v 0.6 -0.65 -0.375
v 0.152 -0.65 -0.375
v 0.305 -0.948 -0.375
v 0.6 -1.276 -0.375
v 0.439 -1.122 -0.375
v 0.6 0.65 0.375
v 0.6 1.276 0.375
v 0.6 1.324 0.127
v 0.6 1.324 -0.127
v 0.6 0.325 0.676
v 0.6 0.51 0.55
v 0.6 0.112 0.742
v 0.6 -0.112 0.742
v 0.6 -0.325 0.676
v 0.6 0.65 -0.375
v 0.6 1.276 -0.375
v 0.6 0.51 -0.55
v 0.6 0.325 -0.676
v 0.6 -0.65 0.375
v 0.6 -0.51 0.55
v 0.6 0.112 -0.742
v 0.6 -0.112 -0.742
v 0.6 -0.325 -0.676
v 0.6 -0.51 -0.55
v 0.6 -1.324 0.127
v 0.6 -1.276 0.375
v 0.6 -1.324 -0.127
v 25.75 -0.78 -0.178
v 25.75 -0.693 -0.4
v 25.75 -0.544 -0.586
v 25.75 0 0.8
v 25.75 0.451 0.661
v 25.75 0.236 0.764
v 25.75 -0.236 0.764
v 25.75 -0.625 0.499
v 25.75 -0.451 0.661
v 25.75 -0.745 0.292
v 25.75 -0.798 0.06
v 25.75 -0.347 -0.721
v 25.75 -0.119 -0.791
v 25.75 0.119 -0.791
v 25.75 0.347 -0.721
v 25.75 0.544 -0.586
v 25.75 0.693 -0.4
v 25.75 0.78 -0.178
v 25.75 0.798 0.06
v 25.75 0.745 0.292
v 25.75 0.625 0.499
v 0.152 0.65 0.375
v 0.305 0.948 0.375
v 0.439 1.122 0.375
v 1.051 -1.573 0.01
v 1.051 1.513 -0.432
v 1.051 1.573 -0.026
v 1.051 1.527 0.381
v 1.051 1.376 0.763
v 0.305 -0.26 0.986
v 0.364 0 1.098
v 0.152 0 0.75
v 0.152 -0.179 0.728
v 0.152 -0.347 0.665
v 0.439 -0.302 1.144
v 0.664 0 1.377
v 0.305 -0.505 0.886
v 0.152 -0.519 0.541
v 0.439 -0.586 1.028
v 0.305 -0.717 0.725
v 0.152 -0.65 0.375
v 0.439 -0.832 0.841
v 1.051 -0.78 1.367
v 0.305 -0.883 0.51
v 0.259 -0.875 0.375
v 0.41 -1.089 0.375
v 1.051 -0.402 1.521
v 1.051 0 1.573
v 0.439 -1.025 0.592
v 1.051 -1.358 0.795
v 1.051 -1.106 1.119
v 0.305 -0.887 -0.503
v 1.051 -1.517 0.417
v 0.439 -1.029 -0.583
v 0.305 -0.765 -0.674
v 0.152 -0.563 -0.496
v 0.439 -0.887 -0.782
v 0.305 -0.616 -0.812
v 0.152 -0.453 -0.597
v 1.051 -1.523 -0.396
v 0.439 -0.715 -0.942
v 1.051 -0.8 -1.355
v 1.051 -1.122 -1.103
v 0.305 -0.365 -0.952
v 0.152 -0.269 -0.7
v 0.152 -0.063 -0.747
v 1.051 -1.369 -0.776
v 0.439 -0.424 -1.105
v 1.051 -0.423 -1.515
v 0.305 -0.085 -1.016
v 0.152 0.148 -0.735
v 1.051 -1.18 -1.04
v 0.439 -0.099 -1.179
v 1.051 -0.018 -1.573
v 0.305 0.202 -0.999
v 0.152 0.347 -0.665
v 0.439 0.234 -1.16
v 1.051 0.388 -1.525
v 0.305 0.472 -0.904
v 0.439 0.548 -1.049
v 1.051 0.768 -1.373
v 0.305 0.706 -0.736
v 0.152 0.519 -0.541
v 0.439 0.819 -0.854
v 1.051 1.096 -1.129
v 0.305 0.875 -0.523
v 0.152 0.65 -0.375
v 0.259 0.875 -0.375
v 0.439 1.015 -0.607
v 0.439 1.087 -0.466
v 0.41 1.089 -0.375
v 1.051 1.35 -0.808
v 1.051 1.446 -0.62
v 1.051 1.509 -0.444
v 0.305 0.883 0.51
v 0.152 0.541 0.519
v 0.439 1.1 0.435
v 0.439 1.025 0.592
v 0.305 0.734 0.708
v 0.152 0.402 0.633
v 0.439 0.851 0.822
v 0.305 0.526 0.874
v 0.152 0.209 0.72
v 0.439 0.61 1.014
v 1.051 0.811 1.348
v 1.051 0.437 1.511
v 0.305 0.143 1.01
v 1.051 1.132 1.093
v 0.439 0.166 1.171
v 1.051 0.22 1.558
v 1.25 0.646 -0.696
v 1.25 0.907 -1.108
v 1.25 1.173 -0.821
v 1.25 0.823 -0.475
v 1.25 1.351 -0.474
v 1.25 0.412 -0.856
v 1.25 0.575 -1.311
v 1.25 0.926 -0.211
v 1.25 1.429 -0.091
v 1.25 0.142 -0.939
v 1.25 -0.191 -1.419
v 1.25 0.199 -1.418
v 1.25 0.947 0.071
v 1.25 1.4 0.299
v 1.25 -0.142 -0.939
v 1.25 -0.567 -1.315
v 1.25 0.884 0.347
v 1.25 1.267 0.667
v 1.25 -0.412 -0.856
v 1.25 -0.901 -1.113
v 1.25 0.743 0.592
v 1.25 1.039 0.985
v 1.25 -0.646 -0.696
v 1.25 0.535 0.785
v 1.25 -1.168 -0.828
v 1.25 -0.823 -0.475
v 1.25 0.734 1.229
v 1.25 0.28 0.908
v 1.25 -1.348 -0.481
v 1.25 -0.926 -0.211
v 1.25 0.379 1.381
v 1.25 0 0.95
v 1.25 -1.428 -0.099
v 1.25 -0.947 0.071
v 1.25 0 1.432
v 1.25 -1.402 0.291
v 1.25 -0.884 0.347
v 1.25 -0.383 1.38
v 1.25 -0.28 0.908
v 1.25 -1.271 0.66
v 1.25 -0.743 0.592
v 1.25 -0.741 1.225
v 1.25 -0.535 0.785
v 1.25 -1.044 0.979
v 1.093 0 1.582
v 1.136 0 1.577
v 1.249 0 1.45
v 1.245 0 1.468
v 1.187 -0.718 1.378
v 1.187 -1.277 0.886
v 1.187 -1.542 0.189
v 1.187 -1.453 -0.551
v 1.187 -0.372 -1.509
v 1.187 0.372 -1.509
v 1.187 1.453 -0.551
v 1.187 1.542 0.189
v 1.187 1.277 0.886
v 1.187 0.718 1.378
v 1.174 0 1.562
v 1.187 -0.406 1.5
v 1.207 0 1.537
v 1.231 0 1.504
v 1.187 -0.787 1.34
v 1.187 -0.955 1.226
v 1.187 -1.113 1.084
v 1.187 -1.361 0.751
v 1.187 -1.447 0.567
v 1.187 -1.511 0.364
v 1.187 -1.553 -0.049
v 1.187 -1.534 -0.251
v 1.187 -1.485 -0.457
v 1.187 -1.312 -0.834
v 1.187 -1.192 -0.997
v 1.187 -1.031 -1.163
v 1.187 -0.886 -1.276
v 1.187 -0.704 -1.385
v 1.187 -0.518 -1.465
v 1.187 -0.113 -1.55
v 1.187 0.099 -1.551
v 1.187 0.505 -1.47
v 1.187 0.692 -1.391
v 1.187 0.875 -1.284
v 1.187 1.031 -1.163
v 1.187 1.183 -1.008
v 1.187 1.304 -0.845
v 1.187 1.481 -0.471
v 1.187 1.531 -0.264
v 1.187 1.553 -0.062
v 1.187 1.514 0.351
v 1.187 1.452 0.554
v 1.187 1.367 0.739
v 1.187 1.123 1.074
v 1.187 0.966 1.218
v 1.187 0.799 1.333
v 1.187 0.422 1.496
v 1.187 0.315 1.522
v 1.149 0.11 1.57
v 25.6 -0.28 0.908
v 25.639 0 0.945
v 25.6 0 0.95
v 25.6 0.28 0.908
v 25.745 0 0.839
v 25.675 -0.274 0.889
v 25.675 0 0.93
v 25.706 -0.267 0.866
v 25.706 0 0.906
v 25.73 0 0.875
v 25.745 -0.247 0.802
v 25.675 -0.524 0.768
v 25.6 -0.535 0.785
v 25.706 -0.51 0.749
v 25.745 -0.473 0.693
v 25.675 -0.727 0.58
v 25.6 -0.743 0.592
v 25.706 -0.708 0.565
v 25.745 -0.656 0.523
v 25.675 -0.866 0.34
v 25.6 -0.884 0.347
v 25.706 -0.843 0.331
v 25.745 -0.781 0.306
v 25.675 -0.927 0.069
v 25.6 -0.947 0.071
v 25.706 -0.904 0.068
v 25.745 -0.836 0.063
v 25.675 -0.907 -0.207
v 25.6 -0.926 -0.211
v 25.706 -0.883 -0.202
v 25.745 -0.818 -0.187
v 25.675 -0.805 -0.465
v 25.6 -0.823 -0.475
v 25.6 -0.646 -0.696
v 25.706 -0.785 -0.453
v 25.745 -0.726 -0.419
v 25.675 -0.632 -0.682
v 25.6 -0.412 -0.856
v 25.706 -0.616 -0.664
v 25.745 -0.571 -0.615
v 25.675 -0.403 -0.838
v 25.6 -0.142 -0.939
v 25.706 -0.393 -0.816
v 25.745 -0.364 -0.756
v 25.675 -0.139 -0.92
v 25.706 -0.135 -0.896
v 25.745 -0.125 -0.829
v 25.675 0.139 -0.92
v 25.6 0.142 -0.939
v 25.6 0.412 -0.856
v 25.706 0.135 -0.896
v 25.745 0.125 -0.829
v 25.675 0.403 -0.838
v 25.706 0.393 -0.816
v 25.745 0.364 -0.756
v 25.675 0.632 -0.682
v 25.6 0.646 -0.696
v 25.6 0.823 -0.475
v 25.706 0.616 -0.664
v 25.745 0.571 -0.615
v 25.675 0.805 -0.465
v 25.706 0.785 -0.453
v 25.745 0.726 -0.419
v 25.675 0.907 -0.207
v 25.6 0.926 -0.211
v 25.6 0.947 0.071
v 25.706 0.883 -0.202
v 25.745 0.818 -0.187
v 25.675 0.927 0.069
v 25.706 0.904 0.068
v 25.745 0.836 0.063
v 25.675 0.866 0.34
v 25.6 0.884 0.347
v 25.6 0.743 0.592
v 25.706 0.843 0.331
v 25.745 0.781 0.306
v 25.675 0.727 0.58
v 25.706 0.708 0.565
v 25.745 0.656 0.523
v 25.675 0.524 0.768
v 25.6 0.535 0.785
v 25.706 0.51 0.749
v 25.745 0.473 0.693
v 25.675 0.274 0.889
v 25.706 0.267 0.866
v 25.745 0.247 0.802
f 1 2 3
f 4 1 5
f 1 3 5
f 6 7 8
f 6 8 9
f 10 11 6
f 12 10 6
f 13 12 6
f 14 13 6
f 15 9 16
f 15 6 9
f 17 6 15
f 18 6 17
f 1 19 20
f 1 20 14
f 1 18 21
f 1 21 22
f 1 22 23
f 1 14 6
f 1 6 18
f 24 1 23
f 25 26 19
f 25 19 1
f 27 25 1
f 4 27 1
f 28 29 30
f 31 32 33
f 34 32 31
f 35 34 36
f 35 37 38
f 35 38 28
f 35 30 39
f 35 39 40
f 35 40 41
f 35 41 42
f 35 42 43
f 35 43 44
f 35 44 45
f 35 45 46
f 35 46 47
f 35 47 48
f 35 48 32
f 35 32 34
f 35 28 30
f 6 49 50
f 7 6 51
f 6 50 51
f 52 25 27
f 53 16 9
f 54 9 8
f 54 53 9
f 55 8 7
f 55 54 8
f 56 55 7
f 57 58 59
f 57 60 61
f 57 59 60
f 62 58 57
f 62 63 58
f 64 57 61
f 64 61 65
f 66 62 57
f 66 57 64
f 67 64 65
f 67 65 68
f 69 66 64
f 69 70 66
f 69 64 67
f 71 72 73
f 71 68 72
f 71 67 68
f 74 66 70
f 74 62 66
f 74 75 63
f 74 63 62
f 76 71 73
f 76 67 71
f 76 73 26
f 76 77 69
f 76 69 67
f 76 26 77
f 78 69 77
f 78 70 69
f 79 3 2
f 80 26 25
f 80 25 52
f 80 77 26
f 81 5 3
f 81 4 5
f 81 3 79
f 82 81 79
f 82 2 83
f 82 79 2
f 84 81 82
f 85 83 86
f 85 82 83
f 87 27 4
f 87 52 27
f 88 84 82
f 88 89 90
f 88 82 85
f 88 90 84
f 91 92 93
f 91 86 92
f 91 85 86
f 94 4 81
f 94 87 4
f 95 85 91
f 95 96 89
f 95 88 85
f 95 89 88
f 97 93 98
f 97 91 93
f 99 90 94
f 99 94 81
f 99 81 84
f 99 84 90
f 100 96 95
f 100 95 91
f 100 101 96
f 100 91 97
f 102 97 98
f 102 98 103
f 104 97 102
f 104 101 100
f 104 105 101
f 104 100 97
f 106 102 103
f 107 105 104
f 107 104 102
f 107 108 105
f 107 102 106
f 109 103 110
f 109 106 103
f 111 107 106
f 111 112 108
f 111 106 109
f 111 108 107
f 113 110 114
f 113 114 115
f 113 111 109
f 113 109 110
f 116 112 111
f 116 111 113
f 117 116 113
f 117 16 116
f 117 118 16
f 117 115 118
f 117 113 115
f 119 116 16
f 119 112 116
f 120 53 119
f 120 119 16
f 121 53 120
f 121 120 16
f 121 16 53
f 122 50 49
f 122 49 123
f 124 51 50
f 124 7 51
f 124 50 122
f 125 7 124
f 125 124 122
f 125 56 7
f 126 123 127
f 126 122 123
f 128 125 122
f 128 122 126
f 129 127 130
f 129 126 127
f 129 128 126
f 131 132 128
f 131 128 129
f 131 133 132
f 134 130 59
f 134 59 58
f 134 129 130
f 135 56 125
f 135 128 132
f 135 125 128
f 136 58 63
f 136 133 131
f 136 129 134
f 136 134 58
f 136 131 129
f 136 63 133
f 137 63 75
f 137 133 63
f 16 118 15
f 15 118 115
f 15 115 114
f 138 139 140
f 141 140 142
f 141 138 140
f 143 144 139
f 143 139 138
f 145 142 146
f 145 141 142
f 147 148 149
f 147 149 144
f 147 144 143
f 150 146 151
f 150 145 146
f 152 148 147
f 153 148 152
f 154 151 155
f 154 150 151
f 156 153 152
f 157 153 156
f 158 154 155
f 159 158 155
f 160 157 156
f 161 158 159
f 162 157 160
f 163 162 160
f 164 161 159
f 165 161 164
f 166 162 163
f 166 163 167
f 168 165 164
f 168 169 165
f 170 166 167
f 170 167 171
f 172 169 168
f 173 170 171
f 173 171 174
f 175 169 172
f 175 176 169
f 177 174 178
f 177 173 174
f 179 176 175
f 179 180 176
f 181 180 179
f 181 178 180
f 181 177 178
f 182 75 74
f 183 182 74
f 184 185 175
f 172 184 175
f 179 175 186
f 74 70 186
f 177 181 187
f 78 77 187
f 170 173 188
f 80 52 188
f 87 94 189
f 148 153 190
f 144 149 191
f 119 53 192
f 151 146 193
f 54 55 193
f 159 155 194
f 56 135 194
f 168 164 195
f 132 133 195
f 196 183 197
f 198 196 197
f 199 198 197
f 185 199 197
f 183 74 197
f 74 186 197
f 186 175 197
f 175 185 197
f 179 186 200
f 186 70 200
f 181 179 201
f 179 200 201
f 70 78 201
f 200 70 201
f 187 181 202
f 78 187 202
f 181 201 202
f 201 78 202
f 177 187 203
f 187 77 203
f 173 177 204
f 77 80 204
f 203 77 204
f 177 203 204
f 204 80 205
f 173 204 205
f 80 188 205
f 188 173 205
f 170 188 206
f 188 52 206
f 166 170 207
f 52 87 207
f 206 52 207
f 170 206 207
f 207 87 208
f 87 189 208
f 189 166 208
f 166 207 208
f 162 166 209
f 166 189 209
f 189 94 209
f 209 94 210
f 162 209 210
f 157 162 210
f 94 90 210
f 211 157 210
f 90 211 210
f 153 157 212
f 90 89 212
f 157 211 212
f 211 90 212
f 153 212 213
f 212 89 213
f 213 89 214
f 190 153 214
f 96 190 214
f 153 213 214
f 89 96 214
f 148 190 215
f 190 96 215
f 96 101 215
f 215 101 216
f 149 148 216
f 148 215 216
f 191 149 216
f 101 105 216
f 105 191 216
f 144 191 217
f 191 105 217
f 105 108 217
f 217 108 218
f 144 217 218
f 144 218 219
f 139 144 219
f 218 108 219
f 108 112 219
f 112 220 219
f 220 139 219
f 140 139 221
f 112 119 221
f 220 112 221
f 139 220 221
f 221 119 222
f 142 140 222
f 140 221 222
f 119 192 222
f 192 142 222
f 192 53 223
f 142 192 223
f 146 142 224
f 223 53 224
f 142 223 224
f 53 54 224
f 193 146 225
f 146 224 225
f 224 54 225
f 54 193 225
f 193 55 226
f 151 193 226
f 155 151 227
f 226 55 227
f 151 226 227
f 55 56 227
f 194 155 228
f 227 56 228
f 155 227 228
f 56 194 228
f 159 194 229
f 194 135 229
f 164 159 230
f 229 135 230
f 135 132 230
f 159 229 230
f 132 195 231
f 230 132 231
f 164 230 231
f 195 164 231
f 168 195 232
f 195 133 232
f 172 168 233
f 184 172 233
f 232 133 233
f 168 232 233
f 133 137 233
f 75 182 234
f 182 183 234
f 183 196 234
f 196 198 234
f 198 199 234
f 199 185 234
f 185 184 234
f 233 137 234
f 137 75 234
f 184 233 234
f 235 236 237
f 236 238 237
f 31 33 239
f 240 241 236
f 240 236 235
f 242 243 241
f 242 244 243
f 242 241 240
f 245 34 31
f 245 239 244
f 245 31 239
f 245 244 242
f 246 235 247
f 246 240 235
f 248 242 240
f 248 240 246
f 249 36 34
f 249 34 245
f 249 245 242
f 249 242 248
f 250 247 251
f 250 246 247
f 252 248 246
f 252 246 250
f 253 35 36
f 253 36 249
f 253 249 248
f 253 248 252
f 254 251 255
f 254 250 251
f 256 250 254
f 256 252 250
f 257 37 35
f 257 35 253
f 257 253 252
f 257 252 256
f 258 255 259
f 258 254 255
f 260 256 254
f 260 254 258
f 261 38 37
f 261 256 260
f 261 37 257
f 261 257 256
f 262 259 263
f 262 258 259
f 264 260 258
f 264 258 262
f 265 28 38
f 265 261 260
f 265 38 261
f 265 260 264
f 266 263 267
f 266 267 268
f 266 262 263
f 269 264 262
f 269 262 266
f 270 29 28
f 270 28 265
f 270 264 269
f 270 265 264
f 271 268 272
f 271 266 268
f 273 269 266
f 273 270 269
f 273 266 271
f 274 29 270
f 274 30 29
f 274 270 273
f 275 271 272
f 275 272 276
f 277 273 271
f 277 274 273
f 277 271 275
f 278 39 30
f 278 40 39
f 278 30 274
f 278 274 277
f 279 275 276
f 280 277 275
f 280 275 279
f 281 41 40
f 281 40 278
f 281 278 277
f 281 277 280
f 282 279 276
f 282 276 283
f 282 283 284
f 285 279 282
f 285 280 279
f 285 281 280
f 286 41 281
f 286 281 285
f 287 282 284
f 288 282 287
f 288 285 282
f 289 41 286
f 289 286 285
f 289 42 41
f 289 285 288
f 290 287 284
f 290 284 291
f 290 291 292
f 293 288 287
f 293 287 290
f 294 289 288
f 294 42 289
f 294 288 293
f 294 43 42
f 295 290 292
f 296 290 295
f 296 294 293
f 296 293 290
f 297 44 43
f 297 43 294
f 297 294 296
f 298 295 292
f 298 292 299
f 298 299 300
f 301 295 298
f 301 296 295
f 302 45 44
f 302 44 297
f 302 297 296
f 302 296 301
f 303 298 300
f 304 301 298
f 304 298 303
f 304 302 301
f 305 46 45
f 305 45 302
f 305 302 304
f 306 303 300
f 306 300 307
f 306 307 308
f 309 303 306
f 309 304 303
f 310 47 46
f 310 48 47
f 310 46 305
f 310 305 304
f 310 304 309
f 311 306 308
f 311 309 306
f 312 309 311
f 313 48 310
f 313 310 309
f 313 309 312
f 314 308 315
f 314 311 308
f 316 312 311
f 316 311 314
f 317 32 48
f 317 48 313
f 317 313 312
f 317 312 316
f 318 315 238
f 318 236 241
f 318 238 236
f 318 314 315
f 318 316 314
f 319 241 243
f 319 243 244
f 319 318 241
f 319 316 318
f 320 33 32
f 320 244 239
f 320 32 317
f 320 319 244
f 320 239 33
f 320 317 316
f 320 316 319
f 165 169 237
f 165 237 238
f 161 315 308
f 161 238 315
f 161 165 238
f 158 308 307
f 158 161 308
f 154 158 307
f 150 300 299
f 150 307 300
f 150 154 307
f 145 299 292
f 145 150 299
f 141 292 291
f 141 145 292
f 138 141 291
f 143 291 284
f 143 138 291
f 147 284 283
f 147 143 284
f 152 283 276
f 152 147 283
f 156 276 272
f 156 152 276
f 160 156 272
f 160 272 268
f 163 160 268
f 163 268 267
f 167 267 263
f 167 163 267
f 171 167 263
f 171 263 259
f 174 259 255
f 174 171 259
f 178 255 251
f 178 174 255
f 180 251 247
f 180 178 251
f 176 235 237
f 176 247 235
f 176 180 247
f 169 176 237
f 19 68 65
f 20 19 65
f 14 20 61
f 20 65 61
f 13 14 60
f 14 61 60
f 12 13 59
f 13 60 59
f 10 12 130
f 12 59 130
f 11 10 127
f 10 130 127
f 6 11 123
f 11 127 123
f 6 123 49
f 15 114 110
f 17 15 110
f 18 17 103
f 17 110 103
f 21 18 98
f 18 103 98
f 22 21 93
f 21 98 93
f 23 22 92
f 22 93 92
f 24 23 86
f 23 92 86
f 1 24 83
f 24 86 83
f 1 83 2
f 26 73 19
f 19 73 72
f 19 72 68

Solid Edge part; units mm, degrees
sketch "Sketch1" plane through (0, 0, 0) normal (0, -1, 0) x (1, 0, 0)
  line L0 (12, 0.95) -> (1.25, 0.95)
  line L1 (1.25, 1.63) -> (1.25, 0.95)
  spline S0 degree 3 poles (0, 0) (0, 0.7831) (0.4356, 1.448) (1.25, 1.63) knots 0 0 0 0 1 1 1 1
  line L2 (25.75, 0) -> (25.75, 0.95)
  line L3 (25.75, 0.95) -> (12, 0.95)
revolve "RevolvedProtrusion1" add sketch "Sketch1" angle 360 about axis through (0, 0, 0) along (1, 0, 0)
sketch "Sketch2" plane through (0, 0, 0) normal (1, 0, 0) x (0, 0, 1)
  line L0 (-0.375, 1.9976) -> (0.375, 1.9976)
  line L1 (0.375, 1.9976) -> (0.375, 0.6495)
  arc A0 (0.375, 0.6495) -> (0.375, -0.6495) centre (0, 0) cw
  line L2 (0.375, -0.6495) -> (0.375, -1.9976)
  line L3 (0.375, -1.9976) -> (-0.375, -1.9976)
  line L4 (-0.375, -1.9976) -> (-0.375, -0.6495)
  line L5 (-0.375, 0.6495) -> (-0.375, 1.9976)
  arc A1 (-0.375, -0.6495) -> (-0.375, 0.6495) centre (0, 0) cw
extrude "Cutout1" cut sketch "Sketch2" along normal blind 0.6
fillet "Round_1" radius 0.15 2 edges at (1.25, 0, -1.63) (25.75, 0, -0.95)
properties material "Galvanized steel"
